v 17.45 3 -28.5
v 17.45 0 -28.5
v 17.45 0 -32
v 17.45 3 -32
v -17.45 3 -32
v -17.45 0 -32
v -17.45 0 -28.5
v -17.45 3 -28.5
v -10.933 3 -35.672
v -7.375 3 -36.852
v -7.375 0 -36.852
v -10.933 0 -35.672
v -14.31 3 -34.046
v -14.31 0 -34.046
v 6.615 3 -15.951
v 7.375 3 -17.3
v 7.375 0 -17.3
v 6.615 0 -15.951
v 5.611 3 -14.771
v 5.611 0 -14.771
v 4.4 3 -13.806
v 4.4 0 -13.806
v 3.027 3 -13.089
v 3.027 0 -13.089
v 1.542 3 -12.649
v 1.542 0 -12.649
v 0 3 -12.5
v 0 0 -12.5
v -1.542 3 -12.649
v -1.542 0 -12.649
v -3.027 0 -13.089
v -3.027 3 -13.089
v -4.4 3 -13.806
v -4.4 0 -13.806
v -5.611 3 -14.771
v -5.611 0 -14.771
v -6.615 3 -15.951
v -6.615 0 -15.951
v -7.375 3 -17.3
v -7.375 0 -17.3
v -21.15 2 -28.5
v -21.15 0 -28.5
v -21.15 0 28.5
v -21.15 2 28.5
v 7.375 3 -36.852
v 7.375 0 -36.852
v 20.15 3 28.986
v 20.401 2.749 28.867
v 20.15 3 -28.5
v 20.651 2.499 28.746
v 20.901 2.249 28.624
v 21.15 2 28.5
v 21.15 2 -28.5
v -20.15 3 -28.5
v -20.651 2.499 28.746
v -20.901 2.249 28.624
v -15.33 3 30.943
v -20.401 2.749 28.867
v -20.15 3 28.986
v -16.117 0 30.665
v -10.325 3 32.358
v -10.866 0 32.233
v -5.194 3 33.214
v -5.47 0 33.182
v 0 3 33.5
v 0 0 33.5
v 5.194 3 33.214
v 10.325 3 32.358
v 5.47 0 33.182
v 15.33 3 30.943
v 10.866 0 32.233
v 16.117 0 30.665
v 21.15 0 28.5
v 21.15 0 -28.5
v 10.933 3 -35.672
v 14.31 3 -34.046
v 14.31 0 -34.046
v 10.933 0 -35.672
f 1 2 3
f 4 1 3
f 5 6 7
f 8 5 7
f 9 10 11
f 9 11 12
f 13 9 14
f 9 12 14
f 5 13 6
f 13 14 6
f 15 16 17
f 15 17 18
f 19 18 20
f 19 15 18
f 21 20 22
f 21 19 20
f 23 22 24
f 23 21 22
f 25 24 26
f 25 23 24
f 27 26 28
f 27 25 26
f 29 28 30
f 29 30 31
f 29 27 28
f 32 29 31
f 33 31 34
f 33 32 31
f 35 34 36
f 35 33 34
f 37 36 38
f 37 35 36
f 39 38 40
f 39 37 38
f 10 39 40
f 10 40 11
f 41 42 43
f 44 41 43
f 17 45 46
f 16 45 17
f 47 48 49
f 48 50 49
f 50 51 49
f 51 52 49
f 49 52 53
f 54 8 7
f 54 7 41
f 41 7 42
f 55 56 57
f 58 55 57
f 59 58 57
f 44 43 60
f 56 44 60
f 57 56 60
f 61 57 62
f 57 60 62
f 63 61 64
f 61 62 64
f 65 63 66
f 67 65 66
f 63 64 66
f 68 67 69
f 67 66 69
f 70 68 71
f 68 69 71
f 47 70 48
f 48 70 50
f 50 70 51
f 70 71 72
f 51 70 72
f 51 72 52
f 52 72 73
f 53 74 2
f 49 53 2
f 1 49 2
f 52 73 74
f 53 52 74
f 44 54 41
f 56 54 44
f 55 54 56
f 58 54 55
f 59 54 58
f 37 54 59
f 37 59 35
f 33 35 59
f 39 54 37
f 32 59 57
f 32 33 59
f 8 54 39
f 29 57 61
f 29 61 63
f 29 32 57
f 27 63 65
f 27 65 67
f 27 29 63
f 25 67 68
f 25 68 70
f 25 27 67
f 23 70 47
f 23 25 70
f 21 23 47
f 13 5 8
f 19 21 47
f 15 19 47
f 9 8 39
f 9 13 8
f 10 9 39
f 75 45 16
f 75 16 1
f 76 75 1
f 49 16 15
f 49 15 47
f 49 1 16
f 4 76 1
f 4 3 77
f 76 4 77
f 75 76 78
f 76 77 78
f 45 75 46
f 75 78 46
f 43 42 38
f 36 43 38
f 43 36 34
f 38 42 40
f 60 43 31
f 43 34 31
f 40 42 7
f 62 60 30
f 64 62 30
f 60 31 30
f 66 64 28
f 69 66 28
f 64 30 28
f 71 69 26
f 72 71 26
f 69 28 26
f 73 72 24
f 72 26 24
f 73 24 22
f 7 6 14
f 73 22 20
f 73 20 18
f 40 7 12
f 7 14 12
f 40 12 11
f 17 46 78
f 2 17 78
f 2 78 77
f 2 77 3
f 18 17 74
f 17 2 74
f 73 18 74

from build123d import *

# Parameters (mm, degrees)
BOSS_EXTRUDE1_DEPTH = 3
CUT_EXTRUDE1_DEPTH  = 3
CHAMFER1_SIZE       = 1


with BuildPart() as part:
    # Sketch1 → Boss-Extrude1 (new body)
    with BuildSketch(Plane(origin=(0, 0, 0), x_dir=(1, 0, 0), z_dir=(0, 1, 0))):
        with BuildLine():
            Line((-21.15, 28.5), (-21.15, -28.5))
            ThreePointArc((-21.15, -28.5), (0, -33.5), (21.15, -28.5))
            Line((21.15, -28.5), (21.15, 28.5))
            Line((21.15, 28.5), (-21.15, 28.5))
        make_face()
        with BuildLine():
            Line((-17.45, 32), (-17.45, 28.5))
            Line((-17.45, 28.5), (17.45, 28.5))
            Line((17.45, 28.5), (17.45, 32))
            ThreePointArc((17.45, 32), (0, 37.8), (-17.45, 32))
        make_face()
    extrude(amount=BOSS_EXTRUDE1_DEPTH)

    # Sketch2 → Cut-Extrude1 (cut)
    with BuildSketch(Plane(origin=(0, 3, 0), x_dir=(1, 0, 0), z_dir=(0, 1, 0))):
        with BuildLine():
            Line((-7.375, 17.3), (-7.375, 37.8))
            Line((-7.375, 37.8), (7.375, 37.8))
            Line((7.375, 37.8), (7.375, 17.3))
            ThreePointArc((7.375, 17.3), (0, 12.5), (-7.375, 17.3))
        make_face()
    extrude(amount=-CUT_EXTRUDE1_DEPTH, mode=Mode.SUBTRACT)

    # Chamfer1
    chamfer1_edges = [part.edges().sort_by_distance(p)[0] for p in [
        (21.15, 3, 0),
        (-21.15, 3, 0),
    ]]
    chamfer(chamfer1_edges, length=CHAMFER1_SIZE)


solid = part.part
